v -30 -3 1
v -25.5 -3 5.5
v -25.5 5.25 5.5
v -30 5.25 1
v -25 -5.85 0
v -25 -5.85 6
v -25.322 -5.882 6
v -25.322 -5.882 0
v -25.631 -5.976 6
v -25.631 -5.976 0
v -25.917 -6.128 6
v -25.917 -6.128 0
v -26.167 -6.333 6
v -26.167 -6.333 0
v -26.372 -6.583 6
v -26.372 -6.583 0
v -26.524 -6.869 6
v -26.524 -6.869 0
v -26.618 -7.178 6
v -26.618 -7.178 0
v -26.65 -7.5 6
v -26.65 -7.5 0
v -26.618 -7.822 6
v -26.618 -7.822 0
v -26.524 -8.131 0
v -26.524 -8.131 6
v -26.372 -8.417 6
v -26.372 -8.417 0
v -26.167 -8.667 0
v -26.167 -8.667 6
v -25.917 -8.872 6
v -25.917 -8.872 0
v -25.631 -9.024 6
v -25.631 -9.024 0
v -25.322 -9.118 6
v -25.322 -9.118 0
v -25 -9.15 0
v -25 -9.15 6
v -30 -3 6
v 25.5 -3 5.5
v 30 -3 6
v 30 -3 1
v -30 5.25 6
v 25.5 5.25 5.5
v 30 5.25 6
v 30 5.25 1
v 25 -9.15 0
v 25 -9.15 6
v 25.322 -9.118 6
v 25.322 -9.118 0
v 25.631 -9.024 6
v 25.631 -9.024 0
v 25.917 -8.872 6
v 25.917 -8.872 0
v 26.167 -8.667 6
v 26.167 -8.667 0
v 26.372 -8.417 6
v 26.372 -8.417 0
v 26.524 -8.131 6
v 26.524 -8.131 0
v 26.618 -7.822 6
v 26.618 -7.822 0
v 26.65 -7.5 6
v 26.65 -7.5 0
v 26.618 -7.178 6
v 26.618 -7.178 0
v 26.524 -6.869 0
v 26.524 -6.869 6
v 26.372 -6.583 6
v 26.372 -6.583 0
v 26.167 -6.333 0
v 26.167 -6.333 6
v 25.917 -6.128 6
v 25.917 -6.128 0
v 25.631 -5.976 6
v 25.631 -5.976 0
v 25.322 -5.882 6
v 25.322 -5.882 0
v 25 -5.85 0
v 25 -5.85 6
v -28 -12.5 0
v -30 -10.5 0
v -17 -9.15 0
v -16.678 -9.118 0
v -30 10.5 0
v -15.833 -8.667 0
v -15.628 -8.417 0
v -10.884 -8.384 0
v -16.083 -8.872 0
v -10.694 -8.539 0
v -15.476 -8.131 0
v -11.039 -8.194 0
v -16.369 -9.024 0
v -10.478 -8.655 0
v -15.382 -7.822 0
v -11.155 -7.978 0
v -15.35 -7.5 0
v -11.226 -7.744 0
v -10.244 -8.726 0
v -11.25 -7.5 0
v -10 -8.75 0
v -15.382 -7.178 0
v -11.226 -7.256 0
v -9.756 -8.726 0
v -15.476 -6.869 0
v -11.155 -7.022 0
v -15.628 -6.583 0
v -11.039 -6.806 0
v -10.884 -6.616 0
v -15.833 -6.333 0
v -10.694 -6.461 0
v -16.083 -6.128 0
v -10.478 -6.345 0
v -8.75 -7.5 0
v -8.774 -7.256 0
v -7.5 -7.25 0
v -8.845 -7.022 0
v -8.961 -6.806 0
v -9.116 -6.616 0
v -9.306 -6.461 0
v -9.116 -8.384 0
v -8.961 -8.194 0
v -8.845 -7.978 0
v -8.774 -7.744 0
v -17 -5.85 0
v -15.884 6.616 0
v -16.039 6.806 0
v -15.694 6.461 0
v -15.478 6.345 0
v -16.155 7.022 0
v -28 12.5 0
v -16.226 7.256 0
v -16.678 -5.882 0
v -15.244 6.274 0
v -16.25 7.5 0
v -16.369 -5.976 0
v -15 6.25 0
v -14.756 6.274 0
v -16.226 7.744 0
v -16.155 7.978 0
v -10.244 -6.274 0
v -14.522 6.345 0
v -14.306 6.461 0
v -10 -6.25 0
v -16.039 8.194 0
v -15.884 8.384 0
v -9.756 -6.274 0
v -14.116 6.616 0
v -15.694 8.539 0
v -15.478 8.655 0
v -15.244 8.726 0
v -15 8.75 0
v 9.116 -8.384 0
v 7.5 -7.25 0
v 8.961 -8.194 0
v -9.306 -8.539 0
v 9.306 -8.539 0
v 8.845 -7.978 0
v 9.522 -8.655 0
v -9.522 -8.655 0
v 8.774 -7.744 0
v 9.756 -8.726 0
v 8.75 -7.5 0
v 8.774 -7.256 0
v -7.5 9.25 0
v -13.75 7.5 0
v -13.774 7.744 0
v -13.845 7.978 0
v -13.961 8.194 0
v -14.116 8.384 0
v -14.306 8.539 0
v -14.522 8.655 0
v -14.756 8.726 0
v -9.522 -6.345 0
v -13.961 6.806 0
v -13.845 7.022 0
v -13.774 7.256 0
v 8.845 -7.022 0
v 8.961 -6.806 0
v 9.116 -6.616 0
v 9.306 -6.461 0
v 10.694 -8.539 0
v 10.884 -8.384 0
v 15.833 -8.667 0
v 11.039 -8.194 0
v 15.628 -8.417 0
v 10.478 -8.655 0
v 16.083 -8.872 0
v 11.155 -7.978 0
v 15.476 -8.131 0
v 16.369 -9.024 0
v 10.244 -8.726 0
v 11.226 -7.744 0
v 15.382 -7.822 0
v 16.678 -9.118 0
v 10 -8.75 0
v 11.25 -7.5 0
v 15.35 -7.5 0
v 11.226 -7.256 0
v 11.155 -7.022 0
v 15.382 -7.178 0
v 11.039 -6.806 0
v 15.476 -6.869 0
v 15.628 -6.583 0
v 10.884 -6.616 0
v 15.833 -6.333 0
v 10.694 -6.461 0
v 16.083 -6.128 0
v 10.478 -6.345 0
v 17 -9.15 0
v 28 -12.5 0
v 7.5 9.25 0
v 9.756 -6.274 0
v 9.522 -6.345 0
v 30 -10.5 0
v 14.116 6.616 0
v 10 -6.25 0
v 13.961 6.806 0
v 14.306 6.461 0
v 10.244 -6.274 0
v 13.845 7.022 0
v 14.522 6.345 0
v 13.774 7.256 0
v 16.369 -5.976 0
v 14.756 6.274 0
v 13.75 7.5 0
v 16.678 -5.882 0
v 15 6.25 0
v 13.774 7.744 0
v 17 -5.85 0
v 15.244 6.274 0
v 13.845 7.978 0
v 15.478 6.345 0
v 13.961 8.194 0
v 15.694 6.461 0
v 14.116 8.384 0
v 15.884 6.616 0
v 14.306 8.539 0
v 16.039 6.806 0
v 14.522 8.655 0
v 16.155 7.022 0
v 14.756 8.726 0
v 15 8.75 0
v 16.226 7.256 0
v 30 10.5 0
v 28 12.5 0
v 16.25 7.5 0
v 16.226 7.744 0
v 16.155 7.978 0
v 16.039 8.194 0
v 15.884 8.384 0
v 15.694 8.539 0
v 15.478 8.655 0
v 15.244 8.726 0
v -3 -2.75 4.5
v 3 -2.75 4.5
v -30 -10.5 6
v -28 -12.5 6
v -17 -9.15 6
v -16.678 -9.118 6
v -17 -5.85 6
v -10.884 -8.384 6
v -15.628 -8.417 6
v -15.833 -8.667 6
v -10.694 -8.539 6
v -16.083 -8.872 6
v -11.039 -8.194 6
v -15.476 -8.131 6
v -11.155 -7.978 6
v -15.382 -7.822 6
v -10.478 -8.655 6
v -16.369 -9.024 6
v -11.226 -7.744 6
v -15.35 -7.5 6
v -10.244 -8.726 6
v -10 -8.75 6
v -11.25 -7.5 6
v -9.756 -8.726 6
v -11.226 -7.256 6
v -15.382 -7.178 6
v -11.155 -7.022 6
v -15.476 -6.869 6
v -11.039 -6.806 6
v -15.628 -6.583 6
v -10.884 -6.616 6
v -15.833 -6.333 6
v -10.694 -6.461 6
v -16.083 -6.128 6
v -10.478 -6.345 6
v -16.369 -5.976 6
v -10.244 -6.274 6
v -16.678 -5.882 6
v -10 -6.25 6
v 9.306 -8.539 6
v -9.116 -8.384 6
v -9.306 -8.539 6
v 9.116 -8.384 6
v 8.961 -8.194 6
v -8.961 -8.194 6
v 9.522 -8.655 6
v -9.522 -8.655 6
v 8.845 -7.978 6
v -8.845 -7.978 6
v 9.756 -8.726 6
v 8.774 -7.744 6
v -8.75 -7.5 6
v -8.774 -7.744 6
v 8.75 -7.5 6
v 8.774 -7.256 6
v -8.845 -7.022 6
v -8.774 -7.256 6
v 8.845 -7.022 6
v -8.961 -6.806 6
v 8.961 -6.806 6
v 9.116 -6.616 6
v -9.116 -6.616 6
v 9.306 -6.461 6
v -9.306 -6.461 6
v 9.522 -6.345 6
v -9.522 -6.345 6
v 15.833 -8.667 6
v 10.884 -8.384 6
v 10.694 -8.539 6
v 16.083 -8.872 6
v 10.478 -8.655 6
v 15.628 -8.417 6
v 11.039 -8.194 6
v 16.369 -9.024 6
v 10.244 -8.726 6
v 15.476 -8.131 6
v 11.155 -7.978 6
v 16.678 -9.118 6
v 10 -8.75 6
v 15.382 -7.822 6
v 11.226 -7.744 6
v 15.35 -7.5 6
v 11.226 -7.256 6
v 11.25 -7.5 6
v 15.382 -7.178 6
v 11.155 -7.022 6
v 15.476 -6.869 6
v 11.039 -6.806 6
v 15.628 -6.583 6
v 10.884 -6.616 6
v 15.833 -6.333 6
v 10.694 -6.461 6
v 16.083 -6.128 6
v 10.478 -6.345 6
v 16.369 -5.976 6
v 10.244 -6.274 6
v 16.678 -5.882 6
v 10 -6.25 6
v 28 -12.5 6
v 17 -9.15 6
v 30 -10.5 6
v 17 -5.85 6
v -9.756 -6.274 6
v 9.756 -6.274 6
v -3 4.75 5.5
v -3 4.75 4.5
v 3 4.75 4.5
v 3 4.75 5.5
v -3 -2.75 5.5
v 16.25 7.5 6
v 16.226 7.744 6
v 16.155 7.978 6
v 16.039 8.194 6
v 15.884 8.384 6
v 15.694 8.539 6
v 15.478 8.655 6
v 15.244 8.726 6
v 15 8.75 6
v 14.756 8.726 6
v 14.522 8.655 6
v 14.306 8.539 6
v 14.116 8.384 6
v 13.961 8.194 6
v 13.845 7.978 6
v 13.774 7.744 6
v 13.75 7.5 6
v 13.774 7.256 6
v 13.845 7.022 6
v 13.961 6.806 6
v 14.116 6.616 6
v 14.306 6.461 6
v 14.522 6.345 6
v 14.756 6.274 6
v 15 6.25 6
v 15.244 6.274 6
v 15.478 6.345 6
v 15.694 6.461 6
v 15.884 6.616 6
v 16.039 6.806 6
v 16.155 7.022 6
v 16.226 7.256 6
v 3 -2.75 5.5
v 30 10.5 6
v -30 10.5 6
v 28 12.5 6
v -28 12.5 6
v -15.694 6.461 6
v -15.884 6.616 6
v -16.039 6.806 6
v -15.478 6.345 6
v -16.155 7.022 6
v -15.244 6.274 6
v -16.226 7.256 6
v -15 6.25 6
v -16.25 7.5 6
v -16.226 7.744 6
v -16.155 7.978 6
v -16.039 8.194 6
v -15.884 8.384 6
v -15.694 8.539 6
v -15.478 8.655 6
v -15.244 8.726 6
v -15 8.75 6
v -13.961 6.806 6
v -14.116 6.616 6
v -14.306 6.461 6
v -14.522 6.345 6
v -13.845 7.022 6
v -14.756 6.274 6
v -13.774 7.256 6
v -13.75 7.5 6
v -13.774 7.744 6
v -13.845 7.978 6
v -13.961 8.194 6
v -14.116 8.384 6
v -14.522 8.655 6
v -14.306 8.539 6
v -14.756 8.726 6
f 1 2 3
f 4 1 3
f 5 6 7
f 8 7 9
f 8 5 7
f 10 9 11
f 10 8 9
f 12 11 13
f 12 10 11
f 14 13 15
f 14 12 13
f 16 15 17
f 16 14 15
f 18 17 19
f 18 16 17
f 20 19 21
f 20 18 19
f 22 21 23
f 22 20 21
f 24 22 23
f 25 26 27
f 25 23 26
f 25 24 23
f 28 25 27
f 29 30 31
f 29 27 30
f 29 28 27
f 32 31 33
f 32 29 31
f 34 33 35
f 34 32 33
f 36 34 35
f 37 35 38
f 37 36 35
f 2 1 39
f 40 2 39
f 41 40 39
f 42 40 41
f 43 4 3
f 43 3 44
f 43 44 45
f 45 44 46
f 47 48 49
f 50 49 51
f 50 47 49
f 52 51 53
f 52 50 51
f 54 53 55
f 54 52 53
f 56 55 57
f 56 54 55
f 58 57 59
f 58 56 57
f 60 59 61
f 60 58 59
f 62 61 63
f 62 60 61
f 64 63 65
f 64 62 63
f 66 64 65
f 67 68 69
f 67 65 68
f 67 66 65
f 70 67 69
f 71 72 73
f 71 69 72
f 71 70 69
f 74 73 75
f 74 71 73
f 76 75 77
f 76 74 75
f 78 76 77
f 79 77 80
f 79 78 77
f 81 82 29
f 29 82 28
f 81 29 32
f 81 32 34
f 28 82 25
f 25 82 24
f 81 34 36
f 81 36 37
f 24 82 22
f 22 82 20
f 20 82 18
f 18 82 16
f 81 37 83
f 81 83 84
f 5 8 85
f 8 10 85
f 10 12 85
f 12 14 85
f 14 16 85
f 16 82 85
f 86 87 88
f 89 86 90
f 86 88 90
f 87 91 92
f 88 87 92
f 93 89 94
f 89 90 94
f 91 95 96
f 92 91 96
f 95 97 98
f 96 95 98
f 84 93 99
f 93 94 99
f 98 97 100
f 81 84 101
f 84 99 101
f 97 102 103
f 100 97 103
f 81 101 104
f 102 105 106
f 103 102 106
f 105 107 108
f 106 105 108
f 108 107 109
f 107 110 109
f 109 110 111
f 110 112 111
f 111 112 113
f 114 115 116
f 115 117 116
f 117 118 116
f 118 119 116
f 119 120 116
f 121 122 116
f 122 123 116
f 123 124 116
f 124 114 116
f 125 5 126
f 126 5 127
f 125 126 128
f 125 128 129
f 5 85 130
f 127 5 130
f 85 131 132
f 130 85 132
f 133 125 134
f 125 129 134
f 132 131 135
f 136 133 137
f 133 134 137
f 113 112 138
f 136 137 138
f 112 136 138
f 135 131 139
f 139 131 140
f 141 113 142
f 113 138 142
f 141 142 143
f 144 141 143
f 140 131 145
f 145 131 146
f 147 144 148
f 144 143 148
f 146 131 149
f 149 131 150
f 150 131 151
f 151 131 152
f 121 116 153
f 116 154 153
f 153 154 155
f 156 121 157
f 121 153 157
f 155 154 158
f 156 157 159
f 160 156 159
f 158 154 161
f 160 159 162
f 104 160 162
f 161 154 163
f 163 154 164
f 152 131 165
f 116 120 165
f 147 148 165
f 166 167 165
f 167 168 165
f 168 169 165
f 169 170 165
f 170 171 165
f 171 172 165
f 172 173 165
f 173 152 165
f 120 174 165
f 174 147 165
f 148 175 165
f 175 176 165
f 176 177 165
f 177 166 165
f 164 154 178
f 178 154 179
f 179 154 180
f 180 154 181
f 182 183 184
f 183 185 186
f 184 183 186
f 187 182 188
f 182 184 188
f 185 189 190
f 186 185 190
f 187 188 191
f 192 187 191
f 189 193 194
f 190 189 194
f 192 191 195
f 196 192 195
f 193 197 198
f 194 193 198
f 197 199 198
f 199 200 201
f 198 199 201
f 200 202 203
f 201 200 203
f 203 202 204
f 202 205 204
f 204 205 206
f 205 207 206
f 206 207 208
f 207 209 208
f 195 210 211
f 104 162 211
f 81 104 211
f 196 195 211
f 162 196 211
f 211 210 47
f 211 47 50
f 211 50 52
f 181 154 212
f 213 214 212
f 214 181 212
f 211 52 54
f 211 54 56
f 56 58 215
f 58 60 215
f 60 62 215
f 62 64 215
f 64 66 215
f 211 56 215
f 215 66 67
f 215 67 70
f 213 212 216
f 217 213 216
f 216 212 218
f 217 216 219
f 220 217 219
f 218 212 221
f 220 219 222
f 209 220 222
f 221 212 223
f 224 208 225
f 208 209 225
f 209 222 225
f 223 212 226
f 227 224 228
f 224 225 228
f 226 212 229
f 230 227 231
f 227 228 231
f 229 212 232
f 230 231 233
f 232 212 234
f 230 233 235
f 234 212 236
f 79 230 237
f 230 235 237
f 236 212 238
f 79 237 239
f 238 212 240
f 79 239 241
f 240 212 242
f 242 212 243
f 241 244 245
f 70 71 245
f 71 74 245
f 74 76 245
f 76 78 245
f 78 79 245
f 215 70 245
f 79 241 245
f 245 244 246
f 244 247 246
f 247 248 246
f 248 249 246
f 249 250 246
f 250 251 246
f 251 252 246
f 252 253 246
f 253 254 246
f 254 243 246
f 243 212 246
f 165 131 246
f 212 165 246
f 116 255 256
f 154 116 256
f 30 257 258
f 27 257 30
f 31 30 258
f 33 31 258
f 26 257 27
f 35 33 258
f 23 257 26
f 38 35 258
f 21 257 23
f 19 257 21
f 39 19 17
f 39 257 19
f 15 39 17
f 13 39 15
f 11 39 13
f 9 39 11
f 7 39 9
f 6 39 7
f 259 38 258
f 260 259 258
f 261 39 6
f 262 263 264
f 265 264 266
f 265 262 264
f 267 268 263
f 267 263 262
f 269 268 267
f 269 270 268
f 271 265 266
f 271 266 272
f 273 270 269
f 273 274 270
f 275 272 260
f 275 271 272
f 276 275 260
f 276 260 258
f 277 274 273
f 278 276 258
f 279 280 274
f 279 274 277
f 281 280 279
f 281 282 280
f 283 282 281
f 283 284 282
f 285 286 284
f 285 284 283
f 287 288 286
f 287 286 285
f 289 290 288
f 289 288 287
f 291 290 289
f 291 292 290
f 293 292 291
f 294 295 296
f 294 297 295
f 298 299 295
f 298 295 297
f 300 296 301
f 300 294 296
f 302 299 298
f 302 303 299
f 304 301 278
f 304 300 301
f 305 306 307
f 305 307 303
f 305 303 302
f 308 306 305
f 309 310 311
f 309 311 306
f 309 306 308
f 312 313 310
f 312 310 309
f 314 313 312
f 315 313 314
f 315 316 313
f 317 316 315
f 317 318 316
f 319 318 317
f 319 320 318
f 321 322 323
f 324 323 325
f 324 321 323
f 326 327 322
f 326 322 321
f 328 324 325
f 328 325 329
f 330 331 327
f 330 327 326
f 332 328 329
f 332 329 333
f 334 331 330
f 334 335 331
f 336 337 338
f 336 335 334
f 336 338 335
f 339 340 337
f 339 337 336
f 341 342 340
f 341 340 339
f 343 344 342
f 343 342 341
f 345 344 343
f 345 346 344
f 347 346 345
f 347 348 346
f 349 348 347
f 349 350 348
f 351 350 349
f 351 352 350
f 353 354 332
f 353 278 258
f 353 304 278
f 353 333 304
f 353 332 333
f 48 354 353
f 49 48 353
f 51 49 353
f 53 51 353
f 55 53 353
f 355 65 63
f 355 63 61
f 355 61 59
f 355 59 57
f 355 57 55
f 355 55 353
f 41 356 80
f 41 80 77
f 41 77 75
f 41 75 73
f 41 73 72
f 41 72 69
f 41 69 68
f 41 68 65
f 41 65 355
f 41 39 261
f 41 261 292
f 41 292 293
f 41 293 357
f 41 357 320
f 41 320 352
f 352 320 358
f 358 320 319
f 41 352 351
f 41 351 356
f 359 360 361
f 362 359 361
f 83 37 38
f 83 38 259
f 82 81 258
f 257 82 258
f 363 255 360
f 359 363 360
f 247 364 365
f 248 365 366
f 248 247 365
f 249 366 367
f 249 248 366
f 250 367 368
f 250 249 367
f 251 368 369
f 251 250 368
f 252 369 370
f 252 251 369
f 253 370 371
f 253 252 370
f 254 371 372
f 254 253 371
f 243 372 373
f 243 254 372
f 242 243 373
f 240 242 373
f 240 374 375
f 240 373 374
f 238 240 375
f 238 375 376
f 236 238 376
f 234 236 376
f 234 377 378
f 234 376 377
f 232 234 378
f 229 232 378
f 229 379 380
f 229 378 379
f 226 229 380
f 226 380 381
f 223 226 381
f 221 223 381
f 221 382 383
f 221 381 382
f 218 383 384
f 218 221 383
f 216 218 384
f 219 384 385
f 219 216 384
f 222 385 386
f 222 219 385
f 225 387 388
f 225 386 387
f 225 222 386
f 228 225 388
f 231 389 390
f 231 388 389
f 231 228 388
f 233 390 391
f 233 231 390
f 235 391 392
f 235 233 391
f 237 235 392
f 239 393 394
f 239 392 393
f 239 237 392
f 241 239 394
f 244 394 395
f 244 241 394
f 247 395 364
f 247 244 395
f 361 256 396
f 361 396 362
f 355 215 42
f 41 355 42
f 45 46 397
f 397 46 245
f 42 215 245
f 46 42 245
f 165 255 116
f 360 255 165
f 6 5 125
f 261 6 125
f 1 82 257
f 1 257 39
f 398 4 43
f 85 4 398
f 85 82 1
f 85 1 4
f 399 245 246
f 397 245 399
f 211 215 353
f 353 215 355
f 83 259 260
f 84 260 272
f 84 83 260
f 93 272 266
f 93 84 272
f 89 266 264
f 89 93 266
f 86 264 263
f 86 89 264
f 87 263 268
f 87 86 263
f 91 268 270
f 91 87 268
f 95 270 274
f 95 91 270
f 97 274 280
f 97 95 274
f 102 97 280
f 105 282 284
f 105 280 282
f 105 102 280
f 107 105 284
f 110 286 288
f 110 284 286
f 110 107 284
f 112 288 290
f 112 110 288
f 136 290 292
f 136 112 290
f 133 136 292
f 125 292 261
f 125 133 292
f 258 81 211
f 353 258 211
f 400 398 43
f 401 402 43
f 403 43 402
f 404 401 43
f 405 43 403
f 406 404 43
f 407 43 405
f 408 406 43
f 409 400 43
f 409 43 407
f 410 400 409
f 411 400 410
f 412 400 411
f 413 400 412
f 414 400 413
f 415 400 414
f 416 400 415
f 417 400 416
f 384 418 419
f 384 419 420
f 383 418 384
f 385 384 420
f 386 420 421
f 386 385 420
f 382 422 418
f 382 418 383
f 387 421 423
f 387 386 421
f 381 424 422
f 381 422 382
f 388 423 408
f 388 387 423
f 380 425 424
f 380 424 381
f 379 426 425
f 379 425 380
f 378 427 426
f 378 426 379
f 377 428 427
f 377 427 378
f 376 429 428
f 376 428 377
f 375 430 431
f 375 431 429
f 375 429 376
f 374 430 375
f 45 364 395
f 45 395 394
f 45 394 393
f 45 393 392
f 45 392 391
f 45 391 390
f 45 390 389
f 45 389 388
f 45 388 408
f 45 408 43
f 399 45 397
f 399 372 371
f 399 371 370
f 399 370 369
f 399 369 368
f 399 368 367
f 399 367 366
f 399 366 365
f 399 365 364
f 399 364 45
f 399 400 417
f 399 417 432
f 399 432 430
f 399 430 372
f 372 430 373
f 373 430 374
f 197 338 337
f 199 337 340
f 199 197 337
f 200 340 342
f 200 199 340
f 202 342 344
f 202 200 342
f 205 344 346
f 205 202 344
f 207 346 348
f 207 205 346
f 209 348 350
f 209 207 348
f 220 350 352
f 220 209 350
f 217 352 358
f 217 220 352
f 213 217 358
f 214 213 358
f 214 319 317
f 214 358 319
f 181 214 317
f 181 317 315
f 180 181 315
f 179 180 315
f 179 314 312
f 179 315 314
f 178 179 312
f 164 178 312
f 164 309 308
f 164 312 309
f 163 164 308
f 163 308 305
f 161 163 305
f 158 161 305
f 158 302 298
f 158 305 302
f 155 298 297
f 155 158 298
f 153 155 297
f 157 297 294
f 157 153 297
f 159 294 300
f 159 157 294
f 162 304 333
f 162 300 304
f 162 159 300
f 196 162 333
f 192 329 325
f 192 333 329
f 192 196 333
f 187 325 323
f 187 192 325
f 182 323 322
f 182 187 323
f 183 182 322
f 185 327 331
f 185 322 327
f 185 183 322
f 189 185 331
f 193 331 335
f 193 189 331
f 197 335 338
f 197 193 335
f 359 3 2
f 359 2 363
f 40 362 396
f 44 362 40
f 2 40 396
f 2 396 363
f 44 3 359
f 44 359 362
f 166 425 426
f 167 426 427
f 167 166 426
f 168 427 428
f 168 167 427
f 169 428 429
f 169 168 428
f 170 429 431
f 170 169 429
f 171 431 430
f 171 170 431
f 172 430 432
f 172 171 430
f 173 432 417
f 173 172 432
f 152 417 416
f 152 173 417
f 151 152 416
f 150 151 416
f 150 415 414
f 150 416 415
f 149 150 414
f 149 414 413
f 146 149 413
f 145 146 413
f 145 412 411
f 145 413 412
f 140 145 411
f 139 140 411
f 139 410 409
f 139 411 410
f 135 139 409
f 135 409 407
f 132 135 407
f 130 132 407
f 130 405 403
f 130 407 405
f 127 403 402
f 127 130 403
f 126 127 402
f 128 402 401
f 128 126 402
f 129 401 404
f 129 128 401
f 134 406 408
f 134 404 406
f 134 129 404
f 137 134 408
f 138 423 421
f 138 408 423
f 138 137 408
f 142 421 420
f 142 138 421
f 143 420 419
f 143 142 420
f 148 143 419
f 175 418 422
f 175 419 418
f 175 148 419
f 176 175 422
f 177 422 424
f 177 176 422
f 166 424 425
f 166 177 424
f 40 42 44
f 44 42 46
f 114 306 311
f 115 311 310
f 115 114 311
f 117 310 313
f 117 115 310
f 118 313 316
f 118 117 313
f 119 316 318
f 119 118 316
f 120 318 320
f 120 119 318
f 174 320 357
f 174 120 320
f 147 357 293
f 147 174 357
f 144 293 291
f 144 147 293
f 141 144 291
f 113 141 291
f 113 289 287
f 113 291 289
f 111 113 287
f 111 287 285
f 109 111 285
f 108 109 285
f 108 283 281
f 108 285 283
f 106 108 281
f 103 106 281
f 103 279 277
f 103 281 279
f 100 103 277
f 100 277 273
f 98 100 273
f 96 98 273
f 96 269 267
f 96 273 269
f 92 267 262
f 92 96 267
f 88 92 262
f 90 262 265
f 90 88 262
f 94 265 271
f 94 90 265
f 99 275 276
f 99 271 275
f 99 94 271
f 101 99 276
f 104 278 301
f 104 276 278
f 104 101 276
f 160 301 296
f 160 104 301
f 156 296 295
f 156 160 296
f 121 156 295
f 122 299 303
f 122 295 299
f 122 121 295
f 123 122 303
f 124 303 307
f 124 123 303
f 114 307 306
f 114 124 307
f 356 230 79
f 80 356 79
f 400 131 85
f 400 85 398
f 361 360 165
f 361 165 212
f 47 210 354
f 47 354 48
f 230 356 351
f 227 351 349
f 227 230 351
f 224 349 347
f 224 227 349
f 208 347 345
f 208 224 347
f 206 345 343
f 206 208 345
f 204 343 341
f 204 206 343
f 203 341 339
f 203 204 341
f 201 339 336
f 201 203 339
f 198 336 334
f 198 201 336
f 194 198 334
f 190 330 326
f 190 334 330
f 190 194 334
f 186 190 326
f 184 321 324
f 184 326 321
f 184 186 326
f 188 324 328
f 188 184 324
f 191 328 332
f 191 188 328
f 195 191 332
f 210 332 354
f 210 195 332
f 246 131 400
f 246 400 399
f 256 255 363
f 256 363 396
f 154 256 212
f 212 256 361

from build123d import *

# Parameters (mm, degrees)
SKETCH_W        = 60
SKETCH_H        = 25
PAD_DEPTH       = 6
SKETCH001_W     = 65
SKETCH001_H     = 8.25
POCKET_DEPTH    = 1
SKETCH002_W     = 6
SKETCH002_H     = 7.5
POCKET001_DEPTH = 10
CHAMFER_SIZE    = 4.5
SKETCH006_R     = 1.25
HOLE001_DEPTH   = 15
CHAMFER002_SIZE = 2
POCKET006_DEPTH = 10


with BuildPart() as part:
    # Sketch → Pad (new body)
    with BuildSketch(Plane.XY):
        Rectangle(SKETCH_W, SKETCH_H)
    extrude(amount=PAD_DEPTH)

    # Sketch001 → Pocket (cut)
    with BuildSketch(Plane.XY.offset(5.5)):
        with Locations((0, 1.125)):
            Rectangle(SKETCH001_W, SKETCH001_H)
    extrude(amount=POCKET_DEPTH, mode=Mode.SUBTRACT)

    # Sketch002 → Pocket001 (cut)
    with BuildSketch(Plane.XY):
        with Locations((0, 1)):
            Rectangle(SKETCH002_W, SKETCH002_H)
    extrude(amount=POCKET001_DEPTH, mode=Mode.SUBTRACT)

    # Chamfer
    chamfer_edges = [part.edges().sort_by_distance(p)[0] for p in [
        (0, 4.75, 0),
        (-3, 1, 0),
        (0, -2.75, 0),
        (3, 1, 0),
        (-30, 1.125, 5.5),
        (30, 1.125, 5.5),
    ]]
    chamfer(chamfer_edges, length=CHAMFER_SIZE)

    # Sketch006 → Hole001 (cut)
    with BuildSketch(Plane.XY):
        with Locations((-15, 7.5)):
            Circle(SKETCH006_R)
        with Locations((15, 7.5)):
            Circle(SKETCH006_R)
        with Locations((-10, -7.5)):
            Circle(SKETCH006_R)
        with Locations((10, -7.5)):
            Circle(SKETCH006_R)
    extrude(amount=HOLE001_DEPTH, mode=Mode.SUBTRACT)

    # Chamfer002
    chamfer002_edges = [part.edges().sort_by_distance(p)[0] for p in [
        (-30, -12.5, 3),
        (-30, 12.5, 3),
        (30, -12.5, 3),
        (30, 12.5, 3),
    ]]
    chamfer(chamfer002_edges, length=CHAMFER002_SIZE)

    # Sketch015 → Pocket006 (cut)
    with BuildSketch(Plane.XY):
        with BuildLine():
            ThreePointArc((-25, -5.85), (-26.65, -7.5), (-25, -9.15))
            Line((-25, -9.15), (-17, -9.15))
            ThreePointArc((-17, -9.15), (-15.35, -7.5), (-17, -5.85))
            Line((-25, -5.85), (-17, -5.85))
        make_face()
        with BuildLine():
            ThreePointArc((17, -5.85), (15.35, -7.5), (17, -9.15))
            Line((17, -9.15), (25, -9.15))
            ThreePointArc((25, -9.15), (26.65, -7.5), (25, -5.85))
            Line((17, -5.85), (25, -5.85))
        make_face()
    extrude(amount=POCKET006_DEPTH, mode=Mode.SUBTRACT)


solid = part.part
